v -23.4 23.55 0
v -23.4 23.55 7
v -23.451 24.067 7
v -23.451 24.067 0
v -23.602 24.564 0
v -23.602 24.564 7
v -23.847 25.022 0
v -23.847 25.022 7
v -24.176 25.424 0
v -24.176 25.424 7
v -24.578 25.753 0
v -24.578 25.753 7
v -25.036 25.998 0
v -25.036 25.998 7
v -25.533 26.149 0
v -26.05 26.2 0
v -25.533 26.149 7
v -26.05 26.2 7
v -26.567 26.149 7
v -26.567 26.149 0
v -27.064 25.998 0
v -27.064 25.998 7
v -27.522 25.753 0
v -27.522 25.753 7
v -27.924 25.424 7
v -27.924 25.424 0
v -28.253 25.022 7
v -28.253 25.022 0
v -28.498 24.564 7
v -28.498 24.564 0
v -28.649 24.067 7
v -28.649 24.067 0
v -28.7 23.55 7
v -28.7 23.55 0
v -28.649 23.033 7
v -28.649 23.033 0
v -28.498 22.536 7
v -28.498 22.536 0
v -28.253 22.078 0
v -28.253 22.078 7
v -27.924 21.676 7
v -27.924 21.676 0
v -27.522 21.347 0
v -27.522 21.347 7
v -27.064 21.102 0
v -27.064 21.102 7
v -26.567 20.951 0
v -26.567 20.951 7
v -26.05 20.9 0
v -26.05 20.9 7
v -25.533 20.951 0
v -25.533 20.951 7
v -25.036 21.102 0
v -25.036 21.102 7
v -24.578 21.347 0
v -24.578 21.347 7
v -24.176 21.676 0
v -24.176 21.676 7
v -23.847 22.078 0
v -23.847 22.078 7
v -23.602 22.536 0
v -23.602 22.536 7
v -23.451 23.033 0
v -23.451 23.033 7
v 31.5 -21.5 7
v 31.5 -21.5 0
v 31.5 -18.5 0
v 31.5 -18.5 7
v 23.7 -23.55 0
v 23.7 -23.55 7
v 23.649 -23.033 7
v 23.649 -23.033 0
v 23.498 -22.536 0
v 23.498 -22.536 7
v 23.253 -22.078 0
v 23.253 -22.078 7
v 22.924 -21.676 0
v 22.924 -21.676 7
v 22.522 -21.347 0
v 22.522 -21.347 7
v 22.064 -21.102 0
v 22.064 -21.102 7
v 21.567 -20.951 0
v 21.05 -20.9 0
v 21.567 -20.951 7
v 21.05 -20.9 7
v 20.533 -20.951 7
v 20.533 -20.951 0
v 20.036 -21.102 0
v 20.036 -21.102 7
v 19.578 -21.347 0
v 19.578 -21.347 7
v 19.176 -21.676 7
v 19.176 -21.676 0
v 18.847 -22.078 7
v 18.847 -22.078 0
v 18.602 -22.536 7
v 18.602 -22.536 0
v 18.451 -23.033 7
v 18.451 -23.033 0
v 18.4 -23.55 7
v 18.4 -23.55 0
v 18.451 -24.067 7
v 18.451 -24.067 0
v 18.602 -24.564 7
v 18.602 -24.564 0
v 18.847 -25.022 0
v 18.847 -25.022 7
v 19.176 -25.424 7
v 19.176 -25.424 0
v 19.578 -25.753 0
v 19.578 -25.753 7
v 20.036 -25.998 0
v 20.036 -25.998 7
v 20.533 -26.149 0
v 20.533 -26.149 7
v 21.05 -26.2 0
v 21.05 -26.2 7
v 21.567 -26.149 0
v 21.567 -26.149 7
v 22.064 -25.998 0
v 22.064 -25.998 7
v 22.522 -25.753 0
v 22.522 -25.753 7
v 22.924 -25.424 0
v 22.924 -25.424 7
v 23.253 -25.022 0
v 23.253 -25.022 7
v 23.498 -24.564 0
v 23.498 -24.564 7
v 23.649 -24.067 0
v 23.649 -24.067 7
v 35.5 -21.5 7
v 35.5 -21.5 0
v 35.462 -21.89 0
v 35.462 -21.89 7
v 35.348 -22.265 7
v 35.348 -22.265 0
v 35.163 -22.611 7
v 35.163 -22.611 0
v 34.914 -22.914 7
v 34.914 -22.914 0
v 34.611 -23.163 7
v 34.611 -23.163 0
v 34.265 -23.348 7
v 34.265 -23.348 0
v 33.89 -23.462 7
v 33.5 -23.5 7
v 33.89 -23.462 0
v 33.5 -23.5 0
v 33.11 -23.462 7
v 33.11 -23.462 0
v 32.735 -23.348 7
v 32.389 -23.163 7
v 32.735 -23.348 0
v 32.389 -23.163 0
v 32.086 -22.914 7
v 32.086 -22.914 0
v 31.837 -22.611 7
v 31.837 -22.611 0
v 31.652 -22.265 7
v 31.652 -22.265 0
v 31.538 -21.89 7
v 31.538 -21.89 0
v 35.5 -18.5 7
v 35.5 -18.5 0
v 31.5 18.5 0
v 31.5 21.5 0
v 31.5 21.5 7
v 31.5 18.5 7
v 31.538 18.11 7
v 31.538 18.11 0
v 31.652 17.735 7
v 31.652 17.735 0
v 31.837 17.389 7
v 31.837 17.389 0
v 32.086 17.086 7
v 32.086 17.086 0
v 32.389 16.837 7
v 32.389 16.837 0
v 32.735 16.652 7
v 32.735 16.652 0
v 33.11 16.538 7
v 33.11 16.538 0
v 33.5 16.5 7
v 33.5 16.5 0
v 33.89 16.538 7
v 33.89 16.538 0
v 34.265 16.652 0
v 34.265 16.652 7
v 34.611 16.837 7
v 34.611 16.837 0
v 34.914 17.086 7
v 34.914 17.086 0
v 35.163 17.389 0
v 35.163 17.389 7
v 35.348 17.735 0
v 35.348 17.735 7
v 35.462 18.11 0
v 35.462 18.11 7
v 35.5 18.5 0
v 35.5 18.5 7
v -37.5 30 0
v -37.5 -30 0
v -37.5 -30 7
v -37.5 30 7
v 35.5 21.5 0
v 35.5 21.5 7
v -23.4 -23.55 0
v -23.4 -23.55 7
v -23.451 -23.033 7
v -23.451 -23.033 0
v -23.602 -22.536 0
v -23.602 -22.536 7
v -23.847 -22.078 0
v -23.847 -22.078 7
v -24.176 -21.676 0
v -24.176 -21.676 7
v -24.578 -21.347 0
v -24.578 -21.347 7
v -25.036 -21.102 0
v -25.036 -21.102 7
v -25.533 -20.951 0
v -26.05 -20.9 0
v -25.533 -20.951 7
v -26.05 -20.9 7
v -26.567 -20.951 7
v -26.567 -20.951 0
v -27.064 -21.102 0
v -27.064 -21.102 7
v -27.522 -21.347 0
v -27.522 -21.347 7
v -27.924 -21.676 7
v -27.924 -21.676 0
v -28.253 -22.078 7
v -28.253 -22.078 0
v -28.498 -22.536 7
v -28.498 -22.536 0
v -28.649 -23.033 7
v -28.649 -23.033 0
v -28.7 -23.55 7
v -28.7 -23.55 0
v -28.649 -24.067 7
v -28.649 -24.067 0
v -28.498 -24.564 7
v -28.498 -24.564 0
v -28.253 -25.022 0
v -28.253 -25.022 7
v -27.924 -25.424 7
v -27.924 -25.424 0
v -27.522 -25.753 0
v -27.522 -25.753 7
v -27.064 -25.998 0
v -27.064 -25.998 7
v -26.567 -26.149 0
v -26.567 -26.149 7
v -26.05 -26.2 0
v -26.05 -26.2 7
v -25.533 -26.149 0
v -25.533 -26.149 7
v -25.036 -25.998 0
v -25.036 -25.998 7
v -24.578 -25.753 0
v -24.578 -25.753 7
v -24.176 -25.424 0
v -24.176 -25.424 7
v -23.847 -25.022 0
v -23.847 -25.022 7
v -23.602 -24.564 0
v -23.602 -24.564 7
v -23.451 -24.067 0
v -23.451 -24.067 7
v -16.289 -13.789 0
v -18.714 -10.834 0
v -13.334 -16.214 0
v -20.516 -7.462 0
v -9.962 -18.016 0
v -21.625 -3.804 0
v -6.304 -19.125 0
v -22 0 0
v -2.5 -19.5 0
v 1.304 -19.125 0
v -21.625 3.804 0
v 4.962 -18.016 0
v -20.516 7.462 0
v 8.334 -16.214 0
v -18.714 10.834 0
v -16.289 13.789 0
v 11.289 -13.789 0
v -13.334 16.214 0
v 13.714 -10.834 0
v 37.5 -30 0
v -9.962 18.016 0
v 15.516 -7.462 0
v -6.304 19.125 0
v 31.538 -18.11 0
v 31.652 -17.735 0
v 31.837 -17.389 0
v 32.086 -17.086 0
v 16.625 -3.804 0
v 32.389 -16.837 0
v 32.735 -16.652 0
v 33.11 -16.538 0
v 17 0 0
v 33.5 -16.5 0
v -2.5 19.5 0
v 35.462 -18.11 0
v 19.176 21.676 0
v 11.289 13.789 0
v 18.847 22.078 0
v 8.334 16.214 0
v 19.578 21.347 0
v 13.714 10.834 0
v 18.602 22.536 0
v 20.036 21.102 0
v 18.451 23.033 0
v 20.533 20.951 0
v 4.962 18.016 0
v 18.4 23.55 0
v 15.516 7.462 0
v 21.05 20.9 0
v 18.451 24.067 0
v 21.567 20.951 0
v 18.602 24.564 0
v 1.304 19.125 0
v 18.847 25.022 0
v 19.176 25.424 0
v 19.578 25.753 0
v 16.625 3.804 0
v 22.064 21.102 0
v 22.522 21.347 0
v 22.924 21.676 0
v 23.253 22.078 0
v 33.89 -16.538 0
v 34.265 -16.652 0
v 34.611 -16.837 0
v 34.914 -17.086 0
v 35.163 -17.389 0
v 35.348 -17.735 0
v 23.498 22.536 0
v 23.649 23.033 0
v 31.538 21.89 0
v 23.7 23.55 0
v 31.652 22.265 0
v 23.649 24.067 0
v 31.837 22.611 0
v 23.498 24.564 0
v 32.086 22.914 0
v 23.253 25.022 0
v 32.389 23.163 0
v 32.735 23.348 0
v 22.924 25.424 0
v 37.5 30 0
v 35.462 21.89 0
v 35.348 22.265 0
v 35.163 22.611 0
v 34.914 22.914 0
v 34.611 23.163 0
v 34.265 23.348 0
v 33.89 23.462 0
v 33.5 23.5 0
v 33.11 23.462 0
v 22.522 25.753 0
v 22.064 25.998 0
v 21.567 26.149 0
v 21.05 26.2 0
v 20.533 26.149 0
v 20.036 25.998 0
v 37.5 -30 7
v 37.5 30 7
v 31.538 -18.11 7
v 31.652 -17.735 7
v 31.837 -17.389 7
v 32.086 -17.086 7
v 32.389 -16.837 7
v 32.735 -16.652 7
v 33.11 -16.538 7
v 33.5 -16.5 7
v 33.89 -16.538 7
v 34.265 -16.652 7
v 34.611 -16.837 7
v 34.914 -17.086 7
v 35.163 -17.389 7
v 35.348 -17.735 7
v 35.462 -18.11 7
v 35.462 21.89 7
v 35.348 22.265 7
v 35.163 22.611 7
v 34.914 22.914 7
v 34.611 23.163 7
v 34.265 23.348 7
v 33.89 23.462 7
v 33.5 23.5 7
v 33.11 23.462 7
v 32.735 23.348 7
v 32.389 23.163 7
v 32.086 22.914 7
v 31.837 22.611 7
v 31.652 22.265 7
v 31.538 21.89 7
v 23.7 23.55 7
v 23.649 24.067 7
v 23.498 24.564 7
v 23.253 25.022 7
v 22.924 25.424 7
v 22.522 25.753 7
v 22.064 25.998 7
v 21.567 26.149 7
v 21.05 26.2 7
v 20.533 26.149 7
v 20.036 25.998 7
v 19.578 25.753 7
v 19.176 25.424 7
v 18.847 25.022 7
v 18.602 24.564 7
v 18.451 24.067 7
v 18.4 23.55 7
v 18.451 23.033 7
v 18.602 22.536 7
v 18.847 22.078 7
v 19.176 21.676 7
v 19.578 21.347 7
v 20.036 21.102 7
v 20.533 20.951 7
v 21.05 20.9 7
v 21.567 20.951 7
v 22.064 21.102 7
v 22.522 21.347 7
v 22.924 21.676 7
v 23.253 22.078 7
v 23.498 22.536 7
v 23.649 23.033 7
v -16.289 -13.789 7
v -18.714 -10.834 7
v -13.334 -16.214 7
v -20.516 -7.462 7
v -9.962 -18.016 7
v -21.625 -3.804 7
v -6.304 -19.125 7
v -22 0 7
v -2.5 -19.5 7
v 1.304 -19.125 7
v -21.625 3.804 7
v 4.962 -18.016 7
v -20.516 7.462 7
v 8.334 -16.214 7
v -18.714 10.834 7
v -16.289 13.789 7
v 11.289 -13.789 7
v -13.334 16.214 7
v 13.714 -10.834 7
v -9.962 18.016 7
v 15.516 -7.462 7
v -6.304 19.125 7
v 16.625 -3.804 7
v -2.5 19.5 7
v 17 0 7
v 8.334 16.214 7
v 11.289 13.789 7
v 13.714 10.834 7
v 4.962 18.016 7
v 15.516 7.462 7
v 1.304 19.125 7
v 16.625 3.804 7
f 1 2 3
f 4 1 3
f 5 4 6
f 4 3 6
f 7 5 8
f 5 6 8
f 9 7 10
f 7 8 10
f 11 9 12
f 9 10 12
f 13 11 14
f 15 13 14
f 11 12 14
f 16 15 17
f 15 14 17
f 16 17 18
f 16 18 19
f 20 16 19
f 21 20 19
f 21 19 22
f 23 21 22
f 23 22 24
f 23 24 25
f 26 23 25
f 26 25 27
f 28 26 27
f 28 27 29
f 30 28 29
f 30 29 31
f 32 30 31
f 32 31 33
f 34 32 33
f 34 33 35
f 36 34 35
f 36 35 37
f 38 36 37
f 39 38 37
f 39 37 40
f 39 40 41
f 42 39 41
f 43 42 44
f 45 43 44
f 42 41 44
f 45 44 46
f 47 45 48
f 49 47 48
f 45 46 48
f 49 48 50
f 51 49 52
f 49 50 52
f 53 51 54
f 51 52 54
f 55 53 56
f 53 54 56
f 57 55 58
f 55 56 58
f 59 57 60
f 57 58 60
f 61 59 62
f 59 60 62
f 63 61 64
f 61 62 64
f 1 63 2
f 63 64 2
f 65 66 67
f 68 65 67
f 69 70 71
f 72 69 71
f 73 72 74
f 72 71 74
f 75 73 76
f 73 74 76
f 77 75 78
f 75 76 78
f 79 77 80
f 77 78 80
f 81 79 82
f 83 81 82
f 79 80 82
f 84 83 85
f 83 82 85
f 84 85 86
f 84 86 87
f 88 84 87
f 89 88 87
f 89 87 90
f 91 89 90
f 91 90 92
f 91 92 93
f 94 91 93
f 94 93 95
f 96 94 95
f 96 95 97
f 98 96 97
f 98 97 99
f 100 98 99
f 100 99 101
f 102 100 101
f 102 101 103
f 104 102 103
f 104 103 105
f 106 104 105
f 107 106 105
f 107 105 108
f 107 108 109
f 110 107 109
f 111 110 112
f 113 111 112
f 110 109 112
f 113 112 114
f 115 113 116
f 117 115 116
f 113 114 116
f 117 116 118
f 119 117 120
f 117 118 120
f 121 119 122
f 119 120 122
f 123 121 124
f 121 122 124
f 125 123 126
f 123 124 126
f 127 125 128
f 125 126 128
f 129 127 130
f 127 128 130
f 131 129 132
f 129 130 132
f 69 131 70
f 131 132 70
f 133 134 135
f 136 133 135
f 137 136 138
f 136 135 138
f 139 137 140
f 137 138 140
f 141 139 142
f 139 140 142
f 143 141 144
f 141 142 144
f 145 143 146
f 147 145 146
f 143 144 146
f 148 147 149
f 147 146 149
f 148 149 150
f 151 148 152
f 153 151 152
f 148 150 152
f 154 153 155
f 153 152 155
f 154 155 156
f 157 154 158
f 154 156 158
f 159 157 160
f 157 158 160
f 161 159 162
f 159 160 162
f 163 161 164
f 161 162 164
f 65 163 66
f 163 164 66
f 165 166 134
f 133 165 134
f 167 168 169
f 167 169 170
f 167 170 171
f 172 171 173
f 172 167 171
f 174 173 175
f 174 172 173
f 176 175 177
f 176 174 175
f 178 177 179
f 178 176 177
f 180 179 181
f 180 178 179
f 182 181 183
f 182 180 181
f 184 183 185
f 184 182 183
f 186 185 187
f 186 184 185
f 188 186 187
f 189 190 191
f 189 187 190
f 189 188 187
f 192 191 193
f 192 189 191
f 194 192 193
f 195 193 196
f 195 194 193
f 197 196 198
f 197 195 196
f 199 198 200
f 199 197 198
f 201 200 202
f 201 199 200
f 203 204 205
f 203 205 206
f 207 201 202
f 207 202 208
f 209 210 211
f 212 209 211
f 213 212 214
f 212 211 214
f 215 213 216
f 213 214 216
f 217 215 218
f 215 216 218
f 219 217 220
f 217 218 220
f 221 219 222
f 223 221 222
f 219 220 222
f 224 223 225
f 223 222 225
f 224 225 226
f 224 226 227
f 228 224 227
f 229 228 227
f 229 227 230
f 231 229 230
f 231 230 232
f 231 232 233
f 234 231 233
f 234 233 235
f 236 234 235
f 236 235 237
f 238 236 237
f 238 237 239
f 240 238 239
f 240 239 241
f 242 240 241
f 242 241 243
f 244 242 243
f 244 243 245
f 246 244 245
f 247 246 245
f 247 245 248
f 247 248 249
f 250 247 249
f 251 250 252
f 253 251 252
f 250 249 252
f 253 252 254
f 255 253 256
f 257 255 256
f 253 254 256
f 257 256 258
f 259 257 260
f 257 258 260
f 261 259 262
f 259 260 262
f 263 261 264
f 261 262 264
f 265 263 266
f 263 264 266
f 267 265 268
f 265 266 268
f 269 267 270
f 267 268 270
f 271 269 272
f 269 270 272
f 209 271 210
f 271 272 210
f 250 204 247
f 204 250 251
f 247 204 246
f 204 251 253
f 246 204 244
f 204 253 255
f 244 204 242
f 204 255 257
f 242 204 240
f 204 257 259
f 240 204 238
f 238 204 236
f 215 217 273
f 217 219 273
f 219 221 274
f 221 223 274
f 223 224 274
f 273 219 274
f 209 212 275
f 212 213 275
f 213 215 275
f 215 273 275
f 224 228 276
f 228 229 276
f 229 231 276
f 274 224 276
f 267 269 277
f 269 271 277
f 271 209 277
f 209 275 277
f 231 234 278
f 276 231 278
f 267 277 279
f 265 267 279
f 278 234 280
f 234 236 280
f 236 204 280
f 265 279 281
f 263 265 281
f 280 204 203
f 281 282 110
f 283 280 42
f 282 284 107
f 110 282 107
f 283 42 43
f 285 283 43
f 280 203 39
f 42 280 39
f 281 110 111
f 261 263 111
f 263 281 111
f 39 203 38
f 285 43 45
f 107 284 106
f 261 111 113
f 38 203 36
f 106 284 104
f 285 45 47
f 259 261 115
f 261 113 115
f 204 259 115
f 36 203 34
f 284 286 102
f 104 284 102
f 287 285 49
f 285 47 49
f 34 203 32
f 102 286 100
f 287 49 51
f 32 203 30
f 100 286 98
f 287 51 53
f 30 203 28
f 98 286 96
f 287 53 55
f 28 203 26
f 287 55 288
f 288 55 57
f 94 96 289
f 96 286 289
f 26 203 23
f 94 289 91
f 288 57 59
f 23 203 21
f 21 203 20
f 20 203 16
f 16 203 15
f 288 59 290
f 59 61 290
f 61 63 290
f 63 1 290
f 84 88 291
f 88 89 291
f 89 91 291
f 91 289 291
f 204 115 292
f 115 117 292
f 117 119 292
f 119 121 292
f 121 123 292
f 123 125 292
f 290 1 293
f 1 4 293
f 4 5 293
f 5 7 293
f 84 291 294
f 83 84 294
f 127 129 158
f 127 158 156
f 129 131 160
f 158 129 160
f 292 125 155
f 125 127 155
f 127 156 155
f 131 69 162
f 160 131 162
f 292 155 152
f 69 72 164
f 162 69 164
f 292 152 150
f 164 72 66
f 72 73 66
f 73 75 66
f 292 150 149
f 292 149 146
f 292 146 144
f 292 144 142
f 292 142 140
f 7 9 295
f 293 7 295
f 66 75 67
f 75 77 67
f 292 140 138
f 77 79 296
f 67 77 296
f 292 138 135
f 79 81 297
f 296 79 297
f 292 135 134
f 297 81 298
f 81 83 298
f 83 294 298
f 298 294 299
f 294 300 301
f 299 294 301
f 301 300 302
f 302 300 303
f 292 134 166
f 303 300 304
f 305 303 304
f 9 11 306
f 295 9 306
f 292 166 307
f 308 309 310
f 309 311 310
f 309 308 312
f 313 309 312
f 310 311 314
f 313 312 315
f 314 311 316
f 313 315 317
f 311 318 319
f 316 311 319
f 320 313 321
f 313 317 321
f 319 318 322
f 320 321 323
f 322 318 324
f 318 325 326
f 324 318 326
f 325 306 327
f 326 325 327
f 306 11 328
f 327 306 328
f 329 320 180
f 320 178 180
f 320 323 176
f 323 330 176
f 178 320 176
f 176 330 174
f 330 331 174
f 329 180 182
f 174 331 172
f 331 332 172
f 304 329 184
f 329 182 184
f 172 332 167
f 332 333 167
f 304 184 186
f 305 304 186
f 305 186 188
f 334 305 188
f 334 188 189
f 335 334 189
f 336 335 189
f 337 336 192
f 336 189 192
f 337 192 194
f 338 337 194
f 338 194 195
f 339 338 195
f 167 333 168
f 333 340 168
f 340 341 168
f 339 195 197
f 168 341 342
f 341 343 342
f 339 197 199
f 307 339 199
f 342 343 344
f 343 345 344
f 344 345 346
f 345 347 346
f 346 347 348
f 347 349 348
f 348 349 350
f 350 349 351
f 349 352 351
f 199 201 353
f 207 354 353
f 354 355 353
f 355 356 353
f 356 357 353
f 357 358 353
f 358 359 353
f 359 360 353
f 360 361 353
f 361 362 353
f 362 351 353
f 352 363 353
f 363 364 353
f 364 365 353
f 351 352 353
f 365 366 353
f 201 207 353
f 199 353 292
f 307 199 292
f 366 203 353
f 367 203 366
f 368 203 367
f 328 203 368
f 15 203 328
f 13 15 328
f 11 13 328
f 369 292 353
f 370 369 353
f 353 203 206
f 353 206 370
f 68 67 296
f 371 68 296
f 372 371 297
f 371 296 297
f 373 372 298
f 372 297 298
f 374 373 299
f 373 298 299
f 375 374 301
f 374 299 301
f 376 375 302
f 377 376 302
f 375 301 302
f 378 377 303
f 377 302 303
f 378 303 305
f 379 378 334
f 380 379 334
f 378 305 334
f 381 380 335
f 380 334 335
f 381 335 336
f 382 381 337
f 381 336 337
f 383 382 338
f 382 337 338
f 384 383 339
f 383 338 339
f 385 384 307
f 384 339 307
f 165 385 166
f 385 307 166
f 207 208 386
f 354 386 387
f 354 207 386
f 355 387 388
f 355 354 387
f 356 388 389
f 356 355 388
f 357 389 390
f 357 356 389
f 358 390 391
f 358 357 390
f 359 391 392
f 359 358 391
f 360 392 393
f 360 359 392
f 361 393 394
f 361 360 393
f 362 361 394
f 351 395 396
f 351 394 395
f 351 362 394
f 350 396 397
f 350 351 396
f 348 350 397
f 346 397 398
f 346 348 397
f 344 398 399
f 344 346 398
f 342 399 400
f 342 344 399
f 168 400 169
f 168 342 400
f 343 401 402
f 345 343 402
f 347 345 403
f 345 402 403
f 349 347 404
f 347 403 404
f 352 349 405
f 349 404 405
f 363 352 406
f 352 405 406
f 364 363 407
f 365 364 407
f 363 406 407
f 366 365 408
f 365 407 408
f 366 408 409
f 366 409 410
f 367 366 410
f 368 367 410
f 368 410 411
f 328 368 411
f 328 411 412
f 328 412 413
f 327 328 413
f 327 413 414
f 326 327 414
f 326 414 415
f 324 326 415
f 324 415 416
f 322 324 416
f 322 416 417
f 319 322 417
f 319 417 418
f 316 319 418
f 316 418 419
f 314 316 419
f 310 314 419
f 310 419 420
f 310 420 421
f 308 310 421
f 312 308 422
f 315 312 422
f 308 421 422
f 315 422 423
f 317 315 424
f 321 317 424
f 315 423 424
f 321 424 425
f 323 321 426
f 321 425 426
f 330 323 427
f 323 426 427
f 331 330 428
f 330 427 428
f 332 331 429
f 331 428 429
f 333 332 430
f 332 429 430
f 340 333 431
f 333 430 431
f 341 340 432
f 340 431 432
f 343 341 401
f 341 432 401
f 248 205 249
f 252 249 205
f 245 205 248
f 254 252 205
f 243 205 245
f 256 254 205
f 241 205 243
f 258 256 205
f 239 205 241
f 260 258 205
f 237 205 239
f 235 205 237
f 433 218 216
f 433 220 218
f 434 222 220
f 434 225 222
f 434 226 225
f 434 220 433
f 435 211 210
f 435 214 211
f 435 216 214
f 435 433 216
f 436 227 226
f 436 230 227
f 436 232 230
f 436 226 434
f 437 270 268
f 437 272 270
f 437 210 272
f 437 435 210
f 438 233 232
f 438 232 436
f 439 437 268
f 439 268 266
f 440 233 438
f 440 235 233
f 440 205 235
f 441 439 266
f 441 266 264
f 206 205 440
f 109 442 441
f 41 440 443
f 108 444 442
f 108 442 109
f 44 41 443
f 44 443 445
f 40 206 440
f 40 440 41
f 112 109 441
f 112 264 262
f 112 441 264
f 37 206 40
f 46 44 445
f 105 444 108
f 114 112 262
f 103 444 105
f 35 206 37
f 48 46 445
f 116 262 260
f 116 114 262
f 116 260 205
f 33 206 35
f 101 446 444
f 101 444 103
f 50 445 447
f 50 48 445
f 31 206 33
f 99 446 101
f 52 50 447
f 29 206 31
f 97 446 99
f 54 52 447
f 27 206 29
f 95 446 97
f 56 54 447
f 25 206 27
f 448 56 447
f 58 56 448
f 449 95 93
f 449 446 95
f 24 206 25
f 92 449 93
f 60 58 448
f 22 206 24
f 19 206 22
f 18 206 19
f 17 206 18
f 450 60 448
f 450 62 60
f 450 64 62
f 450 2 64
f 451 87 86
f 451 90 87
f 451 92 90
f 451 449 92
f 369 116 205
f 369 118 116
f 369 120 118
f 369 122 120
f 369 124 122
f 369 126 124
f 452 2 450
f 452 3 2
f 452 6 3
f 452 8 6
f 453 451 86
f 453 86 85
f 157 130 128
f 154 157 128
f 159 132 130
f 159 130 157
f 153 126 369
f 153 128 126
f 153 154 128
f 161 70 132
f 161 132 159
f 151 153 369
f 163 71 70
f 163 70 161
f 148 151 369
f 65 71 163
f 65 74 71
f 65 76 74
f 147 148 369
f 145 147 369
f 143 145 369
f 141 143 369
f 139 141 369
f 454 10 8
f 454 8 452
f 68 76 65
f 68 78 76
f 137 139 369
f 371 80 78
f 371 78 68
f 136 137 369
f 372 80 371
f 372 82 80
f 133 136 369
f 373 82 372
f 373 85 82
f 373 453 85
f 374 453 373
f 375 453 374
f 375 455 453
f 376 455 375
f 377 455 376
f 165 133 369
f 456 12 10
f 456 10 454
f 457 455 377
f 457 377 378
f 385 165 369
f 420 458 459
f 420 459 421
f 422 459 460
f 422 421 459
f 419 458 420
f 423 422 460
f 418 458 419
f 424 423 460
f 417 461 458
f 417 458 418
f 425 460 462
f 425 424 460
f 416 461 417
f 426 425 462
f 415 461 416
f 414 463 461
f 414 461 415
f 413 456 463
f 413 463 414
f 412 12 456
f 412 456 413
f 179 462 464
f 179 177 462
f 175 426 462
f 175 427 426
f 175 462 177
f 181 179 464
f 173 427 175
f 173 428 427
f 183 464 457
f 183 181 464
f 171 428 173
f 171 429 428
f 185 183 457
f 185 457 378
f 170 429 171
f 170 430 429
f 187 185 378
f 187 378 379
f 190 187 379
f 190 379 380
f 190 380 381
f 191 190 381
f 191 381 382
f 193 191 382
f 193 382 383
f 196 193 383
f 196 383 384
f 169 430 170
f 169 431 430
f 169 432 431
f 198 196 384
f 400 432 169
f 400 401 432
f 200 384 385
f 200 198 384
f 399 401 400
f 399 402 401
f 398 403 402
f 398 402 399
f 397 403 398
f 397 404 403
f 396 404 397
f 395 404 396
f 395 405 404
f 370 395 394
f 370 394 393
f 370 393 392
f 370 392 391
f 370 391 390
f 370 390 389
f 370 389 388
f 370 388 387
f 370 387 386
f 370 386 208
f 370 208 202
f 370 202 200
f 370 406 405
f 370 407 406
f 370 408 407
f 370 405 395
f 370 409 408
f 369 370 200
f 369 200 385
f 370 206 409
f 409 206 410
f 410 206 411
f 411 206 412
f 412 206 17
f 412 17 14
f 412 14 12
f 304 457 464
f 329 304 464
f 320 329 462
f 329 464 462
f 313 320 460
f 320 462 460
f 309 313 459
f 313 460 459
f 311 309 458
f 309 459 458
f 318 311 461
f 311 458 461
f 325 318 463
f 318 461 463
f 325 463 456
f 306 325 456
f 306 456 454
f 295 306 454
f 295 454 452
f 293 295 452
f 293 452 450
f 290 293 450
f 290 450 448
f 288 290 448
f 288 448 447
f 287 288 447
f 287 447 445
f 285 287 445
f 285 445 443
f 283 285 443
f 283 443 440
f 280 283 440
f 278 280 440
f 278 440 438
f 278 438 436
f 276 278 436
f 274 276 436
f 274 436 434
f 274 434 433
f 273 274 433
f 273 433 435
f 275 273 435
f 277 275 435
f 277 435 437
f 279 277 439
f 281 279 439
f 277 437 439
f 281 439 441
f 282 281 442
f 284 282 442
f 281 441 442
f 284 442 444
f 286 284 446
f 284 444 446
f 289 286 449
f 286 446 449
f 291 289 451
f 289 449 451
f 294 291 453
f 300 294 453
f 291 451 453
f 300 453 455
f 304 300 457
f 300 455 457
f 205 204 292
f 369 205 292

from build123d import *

# Parameters (mm, degrees)
SKETCH1_W                  = 75
SKETCH1_H                  = 60
BOSS_EXTRUDE1_DEPTH        = 7
F_5_3_5_3_DIAMETER_HOLE1_D = 5.3
F_10_0_10_DIAMETER_HOLE1_D = 10
SKETCH5_R                  = 19.5
CUT_EXTRUDE1_DEPTH         = 49.53091798
CUT_EXTRUDE2_DEPTH         = 49.53091798


with BuildPart() as part:
    # Sketch1 → Boss-Extrude1 (new body)
    with BuildSketch(Plane.XY):
        Rectangle(SKETCH1_W, SKETCH1_H)
    extrude(amount=BOSS_EXTRUDE1_DEPTH)

    # Ø5.3 (5.3) Diameter Hole1 (through all)
    with Locations(Plane(origin=(21.05, 23.55, 0), x_dir=(-1, 0, 0), z_dir=(0, 0, -1))):
        with Locations((0, 0), (47.1, 0), (47.1, -47.1), (0, -47.1)):
            Hole(F_5_3_5_3_DIAMETER_HOLE1_D / 2)

    # Ø10.0 (10) Diameter Hole1 (through all)
    with Locations(Plane(origin=(-2.5, 0, 0), x_dir=(-1, 0, 0), z_dir=(0, 0, -1))):
        with Locations((0, 0)):
            Hole(F_10_0_10_DIAMETER_HOLE1_D / 2)

    # Sketch5 → Cut-Extrude1 (cut, through all)
    with BuildSketch(Plane.XY.offset(7)):
        with Locations((-2.5, 0)):
            Circle(SKETCH5_R)
    extrude(amount=-CUT_EXTRUDE1_DEPTH, mode=Mode.SUBTRACT)

    # Sketch6 → Cut-Extrude2 (cut, through all)
    with BuildSketch(Plane(origin=(0, 0, 0), x_dir=(-1, 0, 0), z_dir=(0, 0, -1))):
        with BuildLine():
            Line((-35.5, 18.5), (-35.5, 21.5))
            ThreePointArc((-35.5, 21.5), (-33.5, 23.5), (-31.5, 21.5))
            Line((-31.5, 21.5), (-31.5, 18.5))
            ThreePointArc((-31.5, 18.5), (-33.5, 16.5), (-35.5, 18.5))
        make_face()
        with BuildLine():
            Line((-35.5, -18.5), (-35.5, -21.5))
            ThreePointArc((-35.5, -21.5), (-33.5, -23.5), (-31.5, -21.5))
            Line((-31.5, -21.5), (-31.5, -18.5))
            ThreePointArc((-31.5, -18.5), (-33.5, -16.5), (-35.5, -18.5))
        make_face()
    extrude(amount=-CUT_EXTRUDE2_DEPTH, mode=Mode.SUBTRACT)


solid = part.part
